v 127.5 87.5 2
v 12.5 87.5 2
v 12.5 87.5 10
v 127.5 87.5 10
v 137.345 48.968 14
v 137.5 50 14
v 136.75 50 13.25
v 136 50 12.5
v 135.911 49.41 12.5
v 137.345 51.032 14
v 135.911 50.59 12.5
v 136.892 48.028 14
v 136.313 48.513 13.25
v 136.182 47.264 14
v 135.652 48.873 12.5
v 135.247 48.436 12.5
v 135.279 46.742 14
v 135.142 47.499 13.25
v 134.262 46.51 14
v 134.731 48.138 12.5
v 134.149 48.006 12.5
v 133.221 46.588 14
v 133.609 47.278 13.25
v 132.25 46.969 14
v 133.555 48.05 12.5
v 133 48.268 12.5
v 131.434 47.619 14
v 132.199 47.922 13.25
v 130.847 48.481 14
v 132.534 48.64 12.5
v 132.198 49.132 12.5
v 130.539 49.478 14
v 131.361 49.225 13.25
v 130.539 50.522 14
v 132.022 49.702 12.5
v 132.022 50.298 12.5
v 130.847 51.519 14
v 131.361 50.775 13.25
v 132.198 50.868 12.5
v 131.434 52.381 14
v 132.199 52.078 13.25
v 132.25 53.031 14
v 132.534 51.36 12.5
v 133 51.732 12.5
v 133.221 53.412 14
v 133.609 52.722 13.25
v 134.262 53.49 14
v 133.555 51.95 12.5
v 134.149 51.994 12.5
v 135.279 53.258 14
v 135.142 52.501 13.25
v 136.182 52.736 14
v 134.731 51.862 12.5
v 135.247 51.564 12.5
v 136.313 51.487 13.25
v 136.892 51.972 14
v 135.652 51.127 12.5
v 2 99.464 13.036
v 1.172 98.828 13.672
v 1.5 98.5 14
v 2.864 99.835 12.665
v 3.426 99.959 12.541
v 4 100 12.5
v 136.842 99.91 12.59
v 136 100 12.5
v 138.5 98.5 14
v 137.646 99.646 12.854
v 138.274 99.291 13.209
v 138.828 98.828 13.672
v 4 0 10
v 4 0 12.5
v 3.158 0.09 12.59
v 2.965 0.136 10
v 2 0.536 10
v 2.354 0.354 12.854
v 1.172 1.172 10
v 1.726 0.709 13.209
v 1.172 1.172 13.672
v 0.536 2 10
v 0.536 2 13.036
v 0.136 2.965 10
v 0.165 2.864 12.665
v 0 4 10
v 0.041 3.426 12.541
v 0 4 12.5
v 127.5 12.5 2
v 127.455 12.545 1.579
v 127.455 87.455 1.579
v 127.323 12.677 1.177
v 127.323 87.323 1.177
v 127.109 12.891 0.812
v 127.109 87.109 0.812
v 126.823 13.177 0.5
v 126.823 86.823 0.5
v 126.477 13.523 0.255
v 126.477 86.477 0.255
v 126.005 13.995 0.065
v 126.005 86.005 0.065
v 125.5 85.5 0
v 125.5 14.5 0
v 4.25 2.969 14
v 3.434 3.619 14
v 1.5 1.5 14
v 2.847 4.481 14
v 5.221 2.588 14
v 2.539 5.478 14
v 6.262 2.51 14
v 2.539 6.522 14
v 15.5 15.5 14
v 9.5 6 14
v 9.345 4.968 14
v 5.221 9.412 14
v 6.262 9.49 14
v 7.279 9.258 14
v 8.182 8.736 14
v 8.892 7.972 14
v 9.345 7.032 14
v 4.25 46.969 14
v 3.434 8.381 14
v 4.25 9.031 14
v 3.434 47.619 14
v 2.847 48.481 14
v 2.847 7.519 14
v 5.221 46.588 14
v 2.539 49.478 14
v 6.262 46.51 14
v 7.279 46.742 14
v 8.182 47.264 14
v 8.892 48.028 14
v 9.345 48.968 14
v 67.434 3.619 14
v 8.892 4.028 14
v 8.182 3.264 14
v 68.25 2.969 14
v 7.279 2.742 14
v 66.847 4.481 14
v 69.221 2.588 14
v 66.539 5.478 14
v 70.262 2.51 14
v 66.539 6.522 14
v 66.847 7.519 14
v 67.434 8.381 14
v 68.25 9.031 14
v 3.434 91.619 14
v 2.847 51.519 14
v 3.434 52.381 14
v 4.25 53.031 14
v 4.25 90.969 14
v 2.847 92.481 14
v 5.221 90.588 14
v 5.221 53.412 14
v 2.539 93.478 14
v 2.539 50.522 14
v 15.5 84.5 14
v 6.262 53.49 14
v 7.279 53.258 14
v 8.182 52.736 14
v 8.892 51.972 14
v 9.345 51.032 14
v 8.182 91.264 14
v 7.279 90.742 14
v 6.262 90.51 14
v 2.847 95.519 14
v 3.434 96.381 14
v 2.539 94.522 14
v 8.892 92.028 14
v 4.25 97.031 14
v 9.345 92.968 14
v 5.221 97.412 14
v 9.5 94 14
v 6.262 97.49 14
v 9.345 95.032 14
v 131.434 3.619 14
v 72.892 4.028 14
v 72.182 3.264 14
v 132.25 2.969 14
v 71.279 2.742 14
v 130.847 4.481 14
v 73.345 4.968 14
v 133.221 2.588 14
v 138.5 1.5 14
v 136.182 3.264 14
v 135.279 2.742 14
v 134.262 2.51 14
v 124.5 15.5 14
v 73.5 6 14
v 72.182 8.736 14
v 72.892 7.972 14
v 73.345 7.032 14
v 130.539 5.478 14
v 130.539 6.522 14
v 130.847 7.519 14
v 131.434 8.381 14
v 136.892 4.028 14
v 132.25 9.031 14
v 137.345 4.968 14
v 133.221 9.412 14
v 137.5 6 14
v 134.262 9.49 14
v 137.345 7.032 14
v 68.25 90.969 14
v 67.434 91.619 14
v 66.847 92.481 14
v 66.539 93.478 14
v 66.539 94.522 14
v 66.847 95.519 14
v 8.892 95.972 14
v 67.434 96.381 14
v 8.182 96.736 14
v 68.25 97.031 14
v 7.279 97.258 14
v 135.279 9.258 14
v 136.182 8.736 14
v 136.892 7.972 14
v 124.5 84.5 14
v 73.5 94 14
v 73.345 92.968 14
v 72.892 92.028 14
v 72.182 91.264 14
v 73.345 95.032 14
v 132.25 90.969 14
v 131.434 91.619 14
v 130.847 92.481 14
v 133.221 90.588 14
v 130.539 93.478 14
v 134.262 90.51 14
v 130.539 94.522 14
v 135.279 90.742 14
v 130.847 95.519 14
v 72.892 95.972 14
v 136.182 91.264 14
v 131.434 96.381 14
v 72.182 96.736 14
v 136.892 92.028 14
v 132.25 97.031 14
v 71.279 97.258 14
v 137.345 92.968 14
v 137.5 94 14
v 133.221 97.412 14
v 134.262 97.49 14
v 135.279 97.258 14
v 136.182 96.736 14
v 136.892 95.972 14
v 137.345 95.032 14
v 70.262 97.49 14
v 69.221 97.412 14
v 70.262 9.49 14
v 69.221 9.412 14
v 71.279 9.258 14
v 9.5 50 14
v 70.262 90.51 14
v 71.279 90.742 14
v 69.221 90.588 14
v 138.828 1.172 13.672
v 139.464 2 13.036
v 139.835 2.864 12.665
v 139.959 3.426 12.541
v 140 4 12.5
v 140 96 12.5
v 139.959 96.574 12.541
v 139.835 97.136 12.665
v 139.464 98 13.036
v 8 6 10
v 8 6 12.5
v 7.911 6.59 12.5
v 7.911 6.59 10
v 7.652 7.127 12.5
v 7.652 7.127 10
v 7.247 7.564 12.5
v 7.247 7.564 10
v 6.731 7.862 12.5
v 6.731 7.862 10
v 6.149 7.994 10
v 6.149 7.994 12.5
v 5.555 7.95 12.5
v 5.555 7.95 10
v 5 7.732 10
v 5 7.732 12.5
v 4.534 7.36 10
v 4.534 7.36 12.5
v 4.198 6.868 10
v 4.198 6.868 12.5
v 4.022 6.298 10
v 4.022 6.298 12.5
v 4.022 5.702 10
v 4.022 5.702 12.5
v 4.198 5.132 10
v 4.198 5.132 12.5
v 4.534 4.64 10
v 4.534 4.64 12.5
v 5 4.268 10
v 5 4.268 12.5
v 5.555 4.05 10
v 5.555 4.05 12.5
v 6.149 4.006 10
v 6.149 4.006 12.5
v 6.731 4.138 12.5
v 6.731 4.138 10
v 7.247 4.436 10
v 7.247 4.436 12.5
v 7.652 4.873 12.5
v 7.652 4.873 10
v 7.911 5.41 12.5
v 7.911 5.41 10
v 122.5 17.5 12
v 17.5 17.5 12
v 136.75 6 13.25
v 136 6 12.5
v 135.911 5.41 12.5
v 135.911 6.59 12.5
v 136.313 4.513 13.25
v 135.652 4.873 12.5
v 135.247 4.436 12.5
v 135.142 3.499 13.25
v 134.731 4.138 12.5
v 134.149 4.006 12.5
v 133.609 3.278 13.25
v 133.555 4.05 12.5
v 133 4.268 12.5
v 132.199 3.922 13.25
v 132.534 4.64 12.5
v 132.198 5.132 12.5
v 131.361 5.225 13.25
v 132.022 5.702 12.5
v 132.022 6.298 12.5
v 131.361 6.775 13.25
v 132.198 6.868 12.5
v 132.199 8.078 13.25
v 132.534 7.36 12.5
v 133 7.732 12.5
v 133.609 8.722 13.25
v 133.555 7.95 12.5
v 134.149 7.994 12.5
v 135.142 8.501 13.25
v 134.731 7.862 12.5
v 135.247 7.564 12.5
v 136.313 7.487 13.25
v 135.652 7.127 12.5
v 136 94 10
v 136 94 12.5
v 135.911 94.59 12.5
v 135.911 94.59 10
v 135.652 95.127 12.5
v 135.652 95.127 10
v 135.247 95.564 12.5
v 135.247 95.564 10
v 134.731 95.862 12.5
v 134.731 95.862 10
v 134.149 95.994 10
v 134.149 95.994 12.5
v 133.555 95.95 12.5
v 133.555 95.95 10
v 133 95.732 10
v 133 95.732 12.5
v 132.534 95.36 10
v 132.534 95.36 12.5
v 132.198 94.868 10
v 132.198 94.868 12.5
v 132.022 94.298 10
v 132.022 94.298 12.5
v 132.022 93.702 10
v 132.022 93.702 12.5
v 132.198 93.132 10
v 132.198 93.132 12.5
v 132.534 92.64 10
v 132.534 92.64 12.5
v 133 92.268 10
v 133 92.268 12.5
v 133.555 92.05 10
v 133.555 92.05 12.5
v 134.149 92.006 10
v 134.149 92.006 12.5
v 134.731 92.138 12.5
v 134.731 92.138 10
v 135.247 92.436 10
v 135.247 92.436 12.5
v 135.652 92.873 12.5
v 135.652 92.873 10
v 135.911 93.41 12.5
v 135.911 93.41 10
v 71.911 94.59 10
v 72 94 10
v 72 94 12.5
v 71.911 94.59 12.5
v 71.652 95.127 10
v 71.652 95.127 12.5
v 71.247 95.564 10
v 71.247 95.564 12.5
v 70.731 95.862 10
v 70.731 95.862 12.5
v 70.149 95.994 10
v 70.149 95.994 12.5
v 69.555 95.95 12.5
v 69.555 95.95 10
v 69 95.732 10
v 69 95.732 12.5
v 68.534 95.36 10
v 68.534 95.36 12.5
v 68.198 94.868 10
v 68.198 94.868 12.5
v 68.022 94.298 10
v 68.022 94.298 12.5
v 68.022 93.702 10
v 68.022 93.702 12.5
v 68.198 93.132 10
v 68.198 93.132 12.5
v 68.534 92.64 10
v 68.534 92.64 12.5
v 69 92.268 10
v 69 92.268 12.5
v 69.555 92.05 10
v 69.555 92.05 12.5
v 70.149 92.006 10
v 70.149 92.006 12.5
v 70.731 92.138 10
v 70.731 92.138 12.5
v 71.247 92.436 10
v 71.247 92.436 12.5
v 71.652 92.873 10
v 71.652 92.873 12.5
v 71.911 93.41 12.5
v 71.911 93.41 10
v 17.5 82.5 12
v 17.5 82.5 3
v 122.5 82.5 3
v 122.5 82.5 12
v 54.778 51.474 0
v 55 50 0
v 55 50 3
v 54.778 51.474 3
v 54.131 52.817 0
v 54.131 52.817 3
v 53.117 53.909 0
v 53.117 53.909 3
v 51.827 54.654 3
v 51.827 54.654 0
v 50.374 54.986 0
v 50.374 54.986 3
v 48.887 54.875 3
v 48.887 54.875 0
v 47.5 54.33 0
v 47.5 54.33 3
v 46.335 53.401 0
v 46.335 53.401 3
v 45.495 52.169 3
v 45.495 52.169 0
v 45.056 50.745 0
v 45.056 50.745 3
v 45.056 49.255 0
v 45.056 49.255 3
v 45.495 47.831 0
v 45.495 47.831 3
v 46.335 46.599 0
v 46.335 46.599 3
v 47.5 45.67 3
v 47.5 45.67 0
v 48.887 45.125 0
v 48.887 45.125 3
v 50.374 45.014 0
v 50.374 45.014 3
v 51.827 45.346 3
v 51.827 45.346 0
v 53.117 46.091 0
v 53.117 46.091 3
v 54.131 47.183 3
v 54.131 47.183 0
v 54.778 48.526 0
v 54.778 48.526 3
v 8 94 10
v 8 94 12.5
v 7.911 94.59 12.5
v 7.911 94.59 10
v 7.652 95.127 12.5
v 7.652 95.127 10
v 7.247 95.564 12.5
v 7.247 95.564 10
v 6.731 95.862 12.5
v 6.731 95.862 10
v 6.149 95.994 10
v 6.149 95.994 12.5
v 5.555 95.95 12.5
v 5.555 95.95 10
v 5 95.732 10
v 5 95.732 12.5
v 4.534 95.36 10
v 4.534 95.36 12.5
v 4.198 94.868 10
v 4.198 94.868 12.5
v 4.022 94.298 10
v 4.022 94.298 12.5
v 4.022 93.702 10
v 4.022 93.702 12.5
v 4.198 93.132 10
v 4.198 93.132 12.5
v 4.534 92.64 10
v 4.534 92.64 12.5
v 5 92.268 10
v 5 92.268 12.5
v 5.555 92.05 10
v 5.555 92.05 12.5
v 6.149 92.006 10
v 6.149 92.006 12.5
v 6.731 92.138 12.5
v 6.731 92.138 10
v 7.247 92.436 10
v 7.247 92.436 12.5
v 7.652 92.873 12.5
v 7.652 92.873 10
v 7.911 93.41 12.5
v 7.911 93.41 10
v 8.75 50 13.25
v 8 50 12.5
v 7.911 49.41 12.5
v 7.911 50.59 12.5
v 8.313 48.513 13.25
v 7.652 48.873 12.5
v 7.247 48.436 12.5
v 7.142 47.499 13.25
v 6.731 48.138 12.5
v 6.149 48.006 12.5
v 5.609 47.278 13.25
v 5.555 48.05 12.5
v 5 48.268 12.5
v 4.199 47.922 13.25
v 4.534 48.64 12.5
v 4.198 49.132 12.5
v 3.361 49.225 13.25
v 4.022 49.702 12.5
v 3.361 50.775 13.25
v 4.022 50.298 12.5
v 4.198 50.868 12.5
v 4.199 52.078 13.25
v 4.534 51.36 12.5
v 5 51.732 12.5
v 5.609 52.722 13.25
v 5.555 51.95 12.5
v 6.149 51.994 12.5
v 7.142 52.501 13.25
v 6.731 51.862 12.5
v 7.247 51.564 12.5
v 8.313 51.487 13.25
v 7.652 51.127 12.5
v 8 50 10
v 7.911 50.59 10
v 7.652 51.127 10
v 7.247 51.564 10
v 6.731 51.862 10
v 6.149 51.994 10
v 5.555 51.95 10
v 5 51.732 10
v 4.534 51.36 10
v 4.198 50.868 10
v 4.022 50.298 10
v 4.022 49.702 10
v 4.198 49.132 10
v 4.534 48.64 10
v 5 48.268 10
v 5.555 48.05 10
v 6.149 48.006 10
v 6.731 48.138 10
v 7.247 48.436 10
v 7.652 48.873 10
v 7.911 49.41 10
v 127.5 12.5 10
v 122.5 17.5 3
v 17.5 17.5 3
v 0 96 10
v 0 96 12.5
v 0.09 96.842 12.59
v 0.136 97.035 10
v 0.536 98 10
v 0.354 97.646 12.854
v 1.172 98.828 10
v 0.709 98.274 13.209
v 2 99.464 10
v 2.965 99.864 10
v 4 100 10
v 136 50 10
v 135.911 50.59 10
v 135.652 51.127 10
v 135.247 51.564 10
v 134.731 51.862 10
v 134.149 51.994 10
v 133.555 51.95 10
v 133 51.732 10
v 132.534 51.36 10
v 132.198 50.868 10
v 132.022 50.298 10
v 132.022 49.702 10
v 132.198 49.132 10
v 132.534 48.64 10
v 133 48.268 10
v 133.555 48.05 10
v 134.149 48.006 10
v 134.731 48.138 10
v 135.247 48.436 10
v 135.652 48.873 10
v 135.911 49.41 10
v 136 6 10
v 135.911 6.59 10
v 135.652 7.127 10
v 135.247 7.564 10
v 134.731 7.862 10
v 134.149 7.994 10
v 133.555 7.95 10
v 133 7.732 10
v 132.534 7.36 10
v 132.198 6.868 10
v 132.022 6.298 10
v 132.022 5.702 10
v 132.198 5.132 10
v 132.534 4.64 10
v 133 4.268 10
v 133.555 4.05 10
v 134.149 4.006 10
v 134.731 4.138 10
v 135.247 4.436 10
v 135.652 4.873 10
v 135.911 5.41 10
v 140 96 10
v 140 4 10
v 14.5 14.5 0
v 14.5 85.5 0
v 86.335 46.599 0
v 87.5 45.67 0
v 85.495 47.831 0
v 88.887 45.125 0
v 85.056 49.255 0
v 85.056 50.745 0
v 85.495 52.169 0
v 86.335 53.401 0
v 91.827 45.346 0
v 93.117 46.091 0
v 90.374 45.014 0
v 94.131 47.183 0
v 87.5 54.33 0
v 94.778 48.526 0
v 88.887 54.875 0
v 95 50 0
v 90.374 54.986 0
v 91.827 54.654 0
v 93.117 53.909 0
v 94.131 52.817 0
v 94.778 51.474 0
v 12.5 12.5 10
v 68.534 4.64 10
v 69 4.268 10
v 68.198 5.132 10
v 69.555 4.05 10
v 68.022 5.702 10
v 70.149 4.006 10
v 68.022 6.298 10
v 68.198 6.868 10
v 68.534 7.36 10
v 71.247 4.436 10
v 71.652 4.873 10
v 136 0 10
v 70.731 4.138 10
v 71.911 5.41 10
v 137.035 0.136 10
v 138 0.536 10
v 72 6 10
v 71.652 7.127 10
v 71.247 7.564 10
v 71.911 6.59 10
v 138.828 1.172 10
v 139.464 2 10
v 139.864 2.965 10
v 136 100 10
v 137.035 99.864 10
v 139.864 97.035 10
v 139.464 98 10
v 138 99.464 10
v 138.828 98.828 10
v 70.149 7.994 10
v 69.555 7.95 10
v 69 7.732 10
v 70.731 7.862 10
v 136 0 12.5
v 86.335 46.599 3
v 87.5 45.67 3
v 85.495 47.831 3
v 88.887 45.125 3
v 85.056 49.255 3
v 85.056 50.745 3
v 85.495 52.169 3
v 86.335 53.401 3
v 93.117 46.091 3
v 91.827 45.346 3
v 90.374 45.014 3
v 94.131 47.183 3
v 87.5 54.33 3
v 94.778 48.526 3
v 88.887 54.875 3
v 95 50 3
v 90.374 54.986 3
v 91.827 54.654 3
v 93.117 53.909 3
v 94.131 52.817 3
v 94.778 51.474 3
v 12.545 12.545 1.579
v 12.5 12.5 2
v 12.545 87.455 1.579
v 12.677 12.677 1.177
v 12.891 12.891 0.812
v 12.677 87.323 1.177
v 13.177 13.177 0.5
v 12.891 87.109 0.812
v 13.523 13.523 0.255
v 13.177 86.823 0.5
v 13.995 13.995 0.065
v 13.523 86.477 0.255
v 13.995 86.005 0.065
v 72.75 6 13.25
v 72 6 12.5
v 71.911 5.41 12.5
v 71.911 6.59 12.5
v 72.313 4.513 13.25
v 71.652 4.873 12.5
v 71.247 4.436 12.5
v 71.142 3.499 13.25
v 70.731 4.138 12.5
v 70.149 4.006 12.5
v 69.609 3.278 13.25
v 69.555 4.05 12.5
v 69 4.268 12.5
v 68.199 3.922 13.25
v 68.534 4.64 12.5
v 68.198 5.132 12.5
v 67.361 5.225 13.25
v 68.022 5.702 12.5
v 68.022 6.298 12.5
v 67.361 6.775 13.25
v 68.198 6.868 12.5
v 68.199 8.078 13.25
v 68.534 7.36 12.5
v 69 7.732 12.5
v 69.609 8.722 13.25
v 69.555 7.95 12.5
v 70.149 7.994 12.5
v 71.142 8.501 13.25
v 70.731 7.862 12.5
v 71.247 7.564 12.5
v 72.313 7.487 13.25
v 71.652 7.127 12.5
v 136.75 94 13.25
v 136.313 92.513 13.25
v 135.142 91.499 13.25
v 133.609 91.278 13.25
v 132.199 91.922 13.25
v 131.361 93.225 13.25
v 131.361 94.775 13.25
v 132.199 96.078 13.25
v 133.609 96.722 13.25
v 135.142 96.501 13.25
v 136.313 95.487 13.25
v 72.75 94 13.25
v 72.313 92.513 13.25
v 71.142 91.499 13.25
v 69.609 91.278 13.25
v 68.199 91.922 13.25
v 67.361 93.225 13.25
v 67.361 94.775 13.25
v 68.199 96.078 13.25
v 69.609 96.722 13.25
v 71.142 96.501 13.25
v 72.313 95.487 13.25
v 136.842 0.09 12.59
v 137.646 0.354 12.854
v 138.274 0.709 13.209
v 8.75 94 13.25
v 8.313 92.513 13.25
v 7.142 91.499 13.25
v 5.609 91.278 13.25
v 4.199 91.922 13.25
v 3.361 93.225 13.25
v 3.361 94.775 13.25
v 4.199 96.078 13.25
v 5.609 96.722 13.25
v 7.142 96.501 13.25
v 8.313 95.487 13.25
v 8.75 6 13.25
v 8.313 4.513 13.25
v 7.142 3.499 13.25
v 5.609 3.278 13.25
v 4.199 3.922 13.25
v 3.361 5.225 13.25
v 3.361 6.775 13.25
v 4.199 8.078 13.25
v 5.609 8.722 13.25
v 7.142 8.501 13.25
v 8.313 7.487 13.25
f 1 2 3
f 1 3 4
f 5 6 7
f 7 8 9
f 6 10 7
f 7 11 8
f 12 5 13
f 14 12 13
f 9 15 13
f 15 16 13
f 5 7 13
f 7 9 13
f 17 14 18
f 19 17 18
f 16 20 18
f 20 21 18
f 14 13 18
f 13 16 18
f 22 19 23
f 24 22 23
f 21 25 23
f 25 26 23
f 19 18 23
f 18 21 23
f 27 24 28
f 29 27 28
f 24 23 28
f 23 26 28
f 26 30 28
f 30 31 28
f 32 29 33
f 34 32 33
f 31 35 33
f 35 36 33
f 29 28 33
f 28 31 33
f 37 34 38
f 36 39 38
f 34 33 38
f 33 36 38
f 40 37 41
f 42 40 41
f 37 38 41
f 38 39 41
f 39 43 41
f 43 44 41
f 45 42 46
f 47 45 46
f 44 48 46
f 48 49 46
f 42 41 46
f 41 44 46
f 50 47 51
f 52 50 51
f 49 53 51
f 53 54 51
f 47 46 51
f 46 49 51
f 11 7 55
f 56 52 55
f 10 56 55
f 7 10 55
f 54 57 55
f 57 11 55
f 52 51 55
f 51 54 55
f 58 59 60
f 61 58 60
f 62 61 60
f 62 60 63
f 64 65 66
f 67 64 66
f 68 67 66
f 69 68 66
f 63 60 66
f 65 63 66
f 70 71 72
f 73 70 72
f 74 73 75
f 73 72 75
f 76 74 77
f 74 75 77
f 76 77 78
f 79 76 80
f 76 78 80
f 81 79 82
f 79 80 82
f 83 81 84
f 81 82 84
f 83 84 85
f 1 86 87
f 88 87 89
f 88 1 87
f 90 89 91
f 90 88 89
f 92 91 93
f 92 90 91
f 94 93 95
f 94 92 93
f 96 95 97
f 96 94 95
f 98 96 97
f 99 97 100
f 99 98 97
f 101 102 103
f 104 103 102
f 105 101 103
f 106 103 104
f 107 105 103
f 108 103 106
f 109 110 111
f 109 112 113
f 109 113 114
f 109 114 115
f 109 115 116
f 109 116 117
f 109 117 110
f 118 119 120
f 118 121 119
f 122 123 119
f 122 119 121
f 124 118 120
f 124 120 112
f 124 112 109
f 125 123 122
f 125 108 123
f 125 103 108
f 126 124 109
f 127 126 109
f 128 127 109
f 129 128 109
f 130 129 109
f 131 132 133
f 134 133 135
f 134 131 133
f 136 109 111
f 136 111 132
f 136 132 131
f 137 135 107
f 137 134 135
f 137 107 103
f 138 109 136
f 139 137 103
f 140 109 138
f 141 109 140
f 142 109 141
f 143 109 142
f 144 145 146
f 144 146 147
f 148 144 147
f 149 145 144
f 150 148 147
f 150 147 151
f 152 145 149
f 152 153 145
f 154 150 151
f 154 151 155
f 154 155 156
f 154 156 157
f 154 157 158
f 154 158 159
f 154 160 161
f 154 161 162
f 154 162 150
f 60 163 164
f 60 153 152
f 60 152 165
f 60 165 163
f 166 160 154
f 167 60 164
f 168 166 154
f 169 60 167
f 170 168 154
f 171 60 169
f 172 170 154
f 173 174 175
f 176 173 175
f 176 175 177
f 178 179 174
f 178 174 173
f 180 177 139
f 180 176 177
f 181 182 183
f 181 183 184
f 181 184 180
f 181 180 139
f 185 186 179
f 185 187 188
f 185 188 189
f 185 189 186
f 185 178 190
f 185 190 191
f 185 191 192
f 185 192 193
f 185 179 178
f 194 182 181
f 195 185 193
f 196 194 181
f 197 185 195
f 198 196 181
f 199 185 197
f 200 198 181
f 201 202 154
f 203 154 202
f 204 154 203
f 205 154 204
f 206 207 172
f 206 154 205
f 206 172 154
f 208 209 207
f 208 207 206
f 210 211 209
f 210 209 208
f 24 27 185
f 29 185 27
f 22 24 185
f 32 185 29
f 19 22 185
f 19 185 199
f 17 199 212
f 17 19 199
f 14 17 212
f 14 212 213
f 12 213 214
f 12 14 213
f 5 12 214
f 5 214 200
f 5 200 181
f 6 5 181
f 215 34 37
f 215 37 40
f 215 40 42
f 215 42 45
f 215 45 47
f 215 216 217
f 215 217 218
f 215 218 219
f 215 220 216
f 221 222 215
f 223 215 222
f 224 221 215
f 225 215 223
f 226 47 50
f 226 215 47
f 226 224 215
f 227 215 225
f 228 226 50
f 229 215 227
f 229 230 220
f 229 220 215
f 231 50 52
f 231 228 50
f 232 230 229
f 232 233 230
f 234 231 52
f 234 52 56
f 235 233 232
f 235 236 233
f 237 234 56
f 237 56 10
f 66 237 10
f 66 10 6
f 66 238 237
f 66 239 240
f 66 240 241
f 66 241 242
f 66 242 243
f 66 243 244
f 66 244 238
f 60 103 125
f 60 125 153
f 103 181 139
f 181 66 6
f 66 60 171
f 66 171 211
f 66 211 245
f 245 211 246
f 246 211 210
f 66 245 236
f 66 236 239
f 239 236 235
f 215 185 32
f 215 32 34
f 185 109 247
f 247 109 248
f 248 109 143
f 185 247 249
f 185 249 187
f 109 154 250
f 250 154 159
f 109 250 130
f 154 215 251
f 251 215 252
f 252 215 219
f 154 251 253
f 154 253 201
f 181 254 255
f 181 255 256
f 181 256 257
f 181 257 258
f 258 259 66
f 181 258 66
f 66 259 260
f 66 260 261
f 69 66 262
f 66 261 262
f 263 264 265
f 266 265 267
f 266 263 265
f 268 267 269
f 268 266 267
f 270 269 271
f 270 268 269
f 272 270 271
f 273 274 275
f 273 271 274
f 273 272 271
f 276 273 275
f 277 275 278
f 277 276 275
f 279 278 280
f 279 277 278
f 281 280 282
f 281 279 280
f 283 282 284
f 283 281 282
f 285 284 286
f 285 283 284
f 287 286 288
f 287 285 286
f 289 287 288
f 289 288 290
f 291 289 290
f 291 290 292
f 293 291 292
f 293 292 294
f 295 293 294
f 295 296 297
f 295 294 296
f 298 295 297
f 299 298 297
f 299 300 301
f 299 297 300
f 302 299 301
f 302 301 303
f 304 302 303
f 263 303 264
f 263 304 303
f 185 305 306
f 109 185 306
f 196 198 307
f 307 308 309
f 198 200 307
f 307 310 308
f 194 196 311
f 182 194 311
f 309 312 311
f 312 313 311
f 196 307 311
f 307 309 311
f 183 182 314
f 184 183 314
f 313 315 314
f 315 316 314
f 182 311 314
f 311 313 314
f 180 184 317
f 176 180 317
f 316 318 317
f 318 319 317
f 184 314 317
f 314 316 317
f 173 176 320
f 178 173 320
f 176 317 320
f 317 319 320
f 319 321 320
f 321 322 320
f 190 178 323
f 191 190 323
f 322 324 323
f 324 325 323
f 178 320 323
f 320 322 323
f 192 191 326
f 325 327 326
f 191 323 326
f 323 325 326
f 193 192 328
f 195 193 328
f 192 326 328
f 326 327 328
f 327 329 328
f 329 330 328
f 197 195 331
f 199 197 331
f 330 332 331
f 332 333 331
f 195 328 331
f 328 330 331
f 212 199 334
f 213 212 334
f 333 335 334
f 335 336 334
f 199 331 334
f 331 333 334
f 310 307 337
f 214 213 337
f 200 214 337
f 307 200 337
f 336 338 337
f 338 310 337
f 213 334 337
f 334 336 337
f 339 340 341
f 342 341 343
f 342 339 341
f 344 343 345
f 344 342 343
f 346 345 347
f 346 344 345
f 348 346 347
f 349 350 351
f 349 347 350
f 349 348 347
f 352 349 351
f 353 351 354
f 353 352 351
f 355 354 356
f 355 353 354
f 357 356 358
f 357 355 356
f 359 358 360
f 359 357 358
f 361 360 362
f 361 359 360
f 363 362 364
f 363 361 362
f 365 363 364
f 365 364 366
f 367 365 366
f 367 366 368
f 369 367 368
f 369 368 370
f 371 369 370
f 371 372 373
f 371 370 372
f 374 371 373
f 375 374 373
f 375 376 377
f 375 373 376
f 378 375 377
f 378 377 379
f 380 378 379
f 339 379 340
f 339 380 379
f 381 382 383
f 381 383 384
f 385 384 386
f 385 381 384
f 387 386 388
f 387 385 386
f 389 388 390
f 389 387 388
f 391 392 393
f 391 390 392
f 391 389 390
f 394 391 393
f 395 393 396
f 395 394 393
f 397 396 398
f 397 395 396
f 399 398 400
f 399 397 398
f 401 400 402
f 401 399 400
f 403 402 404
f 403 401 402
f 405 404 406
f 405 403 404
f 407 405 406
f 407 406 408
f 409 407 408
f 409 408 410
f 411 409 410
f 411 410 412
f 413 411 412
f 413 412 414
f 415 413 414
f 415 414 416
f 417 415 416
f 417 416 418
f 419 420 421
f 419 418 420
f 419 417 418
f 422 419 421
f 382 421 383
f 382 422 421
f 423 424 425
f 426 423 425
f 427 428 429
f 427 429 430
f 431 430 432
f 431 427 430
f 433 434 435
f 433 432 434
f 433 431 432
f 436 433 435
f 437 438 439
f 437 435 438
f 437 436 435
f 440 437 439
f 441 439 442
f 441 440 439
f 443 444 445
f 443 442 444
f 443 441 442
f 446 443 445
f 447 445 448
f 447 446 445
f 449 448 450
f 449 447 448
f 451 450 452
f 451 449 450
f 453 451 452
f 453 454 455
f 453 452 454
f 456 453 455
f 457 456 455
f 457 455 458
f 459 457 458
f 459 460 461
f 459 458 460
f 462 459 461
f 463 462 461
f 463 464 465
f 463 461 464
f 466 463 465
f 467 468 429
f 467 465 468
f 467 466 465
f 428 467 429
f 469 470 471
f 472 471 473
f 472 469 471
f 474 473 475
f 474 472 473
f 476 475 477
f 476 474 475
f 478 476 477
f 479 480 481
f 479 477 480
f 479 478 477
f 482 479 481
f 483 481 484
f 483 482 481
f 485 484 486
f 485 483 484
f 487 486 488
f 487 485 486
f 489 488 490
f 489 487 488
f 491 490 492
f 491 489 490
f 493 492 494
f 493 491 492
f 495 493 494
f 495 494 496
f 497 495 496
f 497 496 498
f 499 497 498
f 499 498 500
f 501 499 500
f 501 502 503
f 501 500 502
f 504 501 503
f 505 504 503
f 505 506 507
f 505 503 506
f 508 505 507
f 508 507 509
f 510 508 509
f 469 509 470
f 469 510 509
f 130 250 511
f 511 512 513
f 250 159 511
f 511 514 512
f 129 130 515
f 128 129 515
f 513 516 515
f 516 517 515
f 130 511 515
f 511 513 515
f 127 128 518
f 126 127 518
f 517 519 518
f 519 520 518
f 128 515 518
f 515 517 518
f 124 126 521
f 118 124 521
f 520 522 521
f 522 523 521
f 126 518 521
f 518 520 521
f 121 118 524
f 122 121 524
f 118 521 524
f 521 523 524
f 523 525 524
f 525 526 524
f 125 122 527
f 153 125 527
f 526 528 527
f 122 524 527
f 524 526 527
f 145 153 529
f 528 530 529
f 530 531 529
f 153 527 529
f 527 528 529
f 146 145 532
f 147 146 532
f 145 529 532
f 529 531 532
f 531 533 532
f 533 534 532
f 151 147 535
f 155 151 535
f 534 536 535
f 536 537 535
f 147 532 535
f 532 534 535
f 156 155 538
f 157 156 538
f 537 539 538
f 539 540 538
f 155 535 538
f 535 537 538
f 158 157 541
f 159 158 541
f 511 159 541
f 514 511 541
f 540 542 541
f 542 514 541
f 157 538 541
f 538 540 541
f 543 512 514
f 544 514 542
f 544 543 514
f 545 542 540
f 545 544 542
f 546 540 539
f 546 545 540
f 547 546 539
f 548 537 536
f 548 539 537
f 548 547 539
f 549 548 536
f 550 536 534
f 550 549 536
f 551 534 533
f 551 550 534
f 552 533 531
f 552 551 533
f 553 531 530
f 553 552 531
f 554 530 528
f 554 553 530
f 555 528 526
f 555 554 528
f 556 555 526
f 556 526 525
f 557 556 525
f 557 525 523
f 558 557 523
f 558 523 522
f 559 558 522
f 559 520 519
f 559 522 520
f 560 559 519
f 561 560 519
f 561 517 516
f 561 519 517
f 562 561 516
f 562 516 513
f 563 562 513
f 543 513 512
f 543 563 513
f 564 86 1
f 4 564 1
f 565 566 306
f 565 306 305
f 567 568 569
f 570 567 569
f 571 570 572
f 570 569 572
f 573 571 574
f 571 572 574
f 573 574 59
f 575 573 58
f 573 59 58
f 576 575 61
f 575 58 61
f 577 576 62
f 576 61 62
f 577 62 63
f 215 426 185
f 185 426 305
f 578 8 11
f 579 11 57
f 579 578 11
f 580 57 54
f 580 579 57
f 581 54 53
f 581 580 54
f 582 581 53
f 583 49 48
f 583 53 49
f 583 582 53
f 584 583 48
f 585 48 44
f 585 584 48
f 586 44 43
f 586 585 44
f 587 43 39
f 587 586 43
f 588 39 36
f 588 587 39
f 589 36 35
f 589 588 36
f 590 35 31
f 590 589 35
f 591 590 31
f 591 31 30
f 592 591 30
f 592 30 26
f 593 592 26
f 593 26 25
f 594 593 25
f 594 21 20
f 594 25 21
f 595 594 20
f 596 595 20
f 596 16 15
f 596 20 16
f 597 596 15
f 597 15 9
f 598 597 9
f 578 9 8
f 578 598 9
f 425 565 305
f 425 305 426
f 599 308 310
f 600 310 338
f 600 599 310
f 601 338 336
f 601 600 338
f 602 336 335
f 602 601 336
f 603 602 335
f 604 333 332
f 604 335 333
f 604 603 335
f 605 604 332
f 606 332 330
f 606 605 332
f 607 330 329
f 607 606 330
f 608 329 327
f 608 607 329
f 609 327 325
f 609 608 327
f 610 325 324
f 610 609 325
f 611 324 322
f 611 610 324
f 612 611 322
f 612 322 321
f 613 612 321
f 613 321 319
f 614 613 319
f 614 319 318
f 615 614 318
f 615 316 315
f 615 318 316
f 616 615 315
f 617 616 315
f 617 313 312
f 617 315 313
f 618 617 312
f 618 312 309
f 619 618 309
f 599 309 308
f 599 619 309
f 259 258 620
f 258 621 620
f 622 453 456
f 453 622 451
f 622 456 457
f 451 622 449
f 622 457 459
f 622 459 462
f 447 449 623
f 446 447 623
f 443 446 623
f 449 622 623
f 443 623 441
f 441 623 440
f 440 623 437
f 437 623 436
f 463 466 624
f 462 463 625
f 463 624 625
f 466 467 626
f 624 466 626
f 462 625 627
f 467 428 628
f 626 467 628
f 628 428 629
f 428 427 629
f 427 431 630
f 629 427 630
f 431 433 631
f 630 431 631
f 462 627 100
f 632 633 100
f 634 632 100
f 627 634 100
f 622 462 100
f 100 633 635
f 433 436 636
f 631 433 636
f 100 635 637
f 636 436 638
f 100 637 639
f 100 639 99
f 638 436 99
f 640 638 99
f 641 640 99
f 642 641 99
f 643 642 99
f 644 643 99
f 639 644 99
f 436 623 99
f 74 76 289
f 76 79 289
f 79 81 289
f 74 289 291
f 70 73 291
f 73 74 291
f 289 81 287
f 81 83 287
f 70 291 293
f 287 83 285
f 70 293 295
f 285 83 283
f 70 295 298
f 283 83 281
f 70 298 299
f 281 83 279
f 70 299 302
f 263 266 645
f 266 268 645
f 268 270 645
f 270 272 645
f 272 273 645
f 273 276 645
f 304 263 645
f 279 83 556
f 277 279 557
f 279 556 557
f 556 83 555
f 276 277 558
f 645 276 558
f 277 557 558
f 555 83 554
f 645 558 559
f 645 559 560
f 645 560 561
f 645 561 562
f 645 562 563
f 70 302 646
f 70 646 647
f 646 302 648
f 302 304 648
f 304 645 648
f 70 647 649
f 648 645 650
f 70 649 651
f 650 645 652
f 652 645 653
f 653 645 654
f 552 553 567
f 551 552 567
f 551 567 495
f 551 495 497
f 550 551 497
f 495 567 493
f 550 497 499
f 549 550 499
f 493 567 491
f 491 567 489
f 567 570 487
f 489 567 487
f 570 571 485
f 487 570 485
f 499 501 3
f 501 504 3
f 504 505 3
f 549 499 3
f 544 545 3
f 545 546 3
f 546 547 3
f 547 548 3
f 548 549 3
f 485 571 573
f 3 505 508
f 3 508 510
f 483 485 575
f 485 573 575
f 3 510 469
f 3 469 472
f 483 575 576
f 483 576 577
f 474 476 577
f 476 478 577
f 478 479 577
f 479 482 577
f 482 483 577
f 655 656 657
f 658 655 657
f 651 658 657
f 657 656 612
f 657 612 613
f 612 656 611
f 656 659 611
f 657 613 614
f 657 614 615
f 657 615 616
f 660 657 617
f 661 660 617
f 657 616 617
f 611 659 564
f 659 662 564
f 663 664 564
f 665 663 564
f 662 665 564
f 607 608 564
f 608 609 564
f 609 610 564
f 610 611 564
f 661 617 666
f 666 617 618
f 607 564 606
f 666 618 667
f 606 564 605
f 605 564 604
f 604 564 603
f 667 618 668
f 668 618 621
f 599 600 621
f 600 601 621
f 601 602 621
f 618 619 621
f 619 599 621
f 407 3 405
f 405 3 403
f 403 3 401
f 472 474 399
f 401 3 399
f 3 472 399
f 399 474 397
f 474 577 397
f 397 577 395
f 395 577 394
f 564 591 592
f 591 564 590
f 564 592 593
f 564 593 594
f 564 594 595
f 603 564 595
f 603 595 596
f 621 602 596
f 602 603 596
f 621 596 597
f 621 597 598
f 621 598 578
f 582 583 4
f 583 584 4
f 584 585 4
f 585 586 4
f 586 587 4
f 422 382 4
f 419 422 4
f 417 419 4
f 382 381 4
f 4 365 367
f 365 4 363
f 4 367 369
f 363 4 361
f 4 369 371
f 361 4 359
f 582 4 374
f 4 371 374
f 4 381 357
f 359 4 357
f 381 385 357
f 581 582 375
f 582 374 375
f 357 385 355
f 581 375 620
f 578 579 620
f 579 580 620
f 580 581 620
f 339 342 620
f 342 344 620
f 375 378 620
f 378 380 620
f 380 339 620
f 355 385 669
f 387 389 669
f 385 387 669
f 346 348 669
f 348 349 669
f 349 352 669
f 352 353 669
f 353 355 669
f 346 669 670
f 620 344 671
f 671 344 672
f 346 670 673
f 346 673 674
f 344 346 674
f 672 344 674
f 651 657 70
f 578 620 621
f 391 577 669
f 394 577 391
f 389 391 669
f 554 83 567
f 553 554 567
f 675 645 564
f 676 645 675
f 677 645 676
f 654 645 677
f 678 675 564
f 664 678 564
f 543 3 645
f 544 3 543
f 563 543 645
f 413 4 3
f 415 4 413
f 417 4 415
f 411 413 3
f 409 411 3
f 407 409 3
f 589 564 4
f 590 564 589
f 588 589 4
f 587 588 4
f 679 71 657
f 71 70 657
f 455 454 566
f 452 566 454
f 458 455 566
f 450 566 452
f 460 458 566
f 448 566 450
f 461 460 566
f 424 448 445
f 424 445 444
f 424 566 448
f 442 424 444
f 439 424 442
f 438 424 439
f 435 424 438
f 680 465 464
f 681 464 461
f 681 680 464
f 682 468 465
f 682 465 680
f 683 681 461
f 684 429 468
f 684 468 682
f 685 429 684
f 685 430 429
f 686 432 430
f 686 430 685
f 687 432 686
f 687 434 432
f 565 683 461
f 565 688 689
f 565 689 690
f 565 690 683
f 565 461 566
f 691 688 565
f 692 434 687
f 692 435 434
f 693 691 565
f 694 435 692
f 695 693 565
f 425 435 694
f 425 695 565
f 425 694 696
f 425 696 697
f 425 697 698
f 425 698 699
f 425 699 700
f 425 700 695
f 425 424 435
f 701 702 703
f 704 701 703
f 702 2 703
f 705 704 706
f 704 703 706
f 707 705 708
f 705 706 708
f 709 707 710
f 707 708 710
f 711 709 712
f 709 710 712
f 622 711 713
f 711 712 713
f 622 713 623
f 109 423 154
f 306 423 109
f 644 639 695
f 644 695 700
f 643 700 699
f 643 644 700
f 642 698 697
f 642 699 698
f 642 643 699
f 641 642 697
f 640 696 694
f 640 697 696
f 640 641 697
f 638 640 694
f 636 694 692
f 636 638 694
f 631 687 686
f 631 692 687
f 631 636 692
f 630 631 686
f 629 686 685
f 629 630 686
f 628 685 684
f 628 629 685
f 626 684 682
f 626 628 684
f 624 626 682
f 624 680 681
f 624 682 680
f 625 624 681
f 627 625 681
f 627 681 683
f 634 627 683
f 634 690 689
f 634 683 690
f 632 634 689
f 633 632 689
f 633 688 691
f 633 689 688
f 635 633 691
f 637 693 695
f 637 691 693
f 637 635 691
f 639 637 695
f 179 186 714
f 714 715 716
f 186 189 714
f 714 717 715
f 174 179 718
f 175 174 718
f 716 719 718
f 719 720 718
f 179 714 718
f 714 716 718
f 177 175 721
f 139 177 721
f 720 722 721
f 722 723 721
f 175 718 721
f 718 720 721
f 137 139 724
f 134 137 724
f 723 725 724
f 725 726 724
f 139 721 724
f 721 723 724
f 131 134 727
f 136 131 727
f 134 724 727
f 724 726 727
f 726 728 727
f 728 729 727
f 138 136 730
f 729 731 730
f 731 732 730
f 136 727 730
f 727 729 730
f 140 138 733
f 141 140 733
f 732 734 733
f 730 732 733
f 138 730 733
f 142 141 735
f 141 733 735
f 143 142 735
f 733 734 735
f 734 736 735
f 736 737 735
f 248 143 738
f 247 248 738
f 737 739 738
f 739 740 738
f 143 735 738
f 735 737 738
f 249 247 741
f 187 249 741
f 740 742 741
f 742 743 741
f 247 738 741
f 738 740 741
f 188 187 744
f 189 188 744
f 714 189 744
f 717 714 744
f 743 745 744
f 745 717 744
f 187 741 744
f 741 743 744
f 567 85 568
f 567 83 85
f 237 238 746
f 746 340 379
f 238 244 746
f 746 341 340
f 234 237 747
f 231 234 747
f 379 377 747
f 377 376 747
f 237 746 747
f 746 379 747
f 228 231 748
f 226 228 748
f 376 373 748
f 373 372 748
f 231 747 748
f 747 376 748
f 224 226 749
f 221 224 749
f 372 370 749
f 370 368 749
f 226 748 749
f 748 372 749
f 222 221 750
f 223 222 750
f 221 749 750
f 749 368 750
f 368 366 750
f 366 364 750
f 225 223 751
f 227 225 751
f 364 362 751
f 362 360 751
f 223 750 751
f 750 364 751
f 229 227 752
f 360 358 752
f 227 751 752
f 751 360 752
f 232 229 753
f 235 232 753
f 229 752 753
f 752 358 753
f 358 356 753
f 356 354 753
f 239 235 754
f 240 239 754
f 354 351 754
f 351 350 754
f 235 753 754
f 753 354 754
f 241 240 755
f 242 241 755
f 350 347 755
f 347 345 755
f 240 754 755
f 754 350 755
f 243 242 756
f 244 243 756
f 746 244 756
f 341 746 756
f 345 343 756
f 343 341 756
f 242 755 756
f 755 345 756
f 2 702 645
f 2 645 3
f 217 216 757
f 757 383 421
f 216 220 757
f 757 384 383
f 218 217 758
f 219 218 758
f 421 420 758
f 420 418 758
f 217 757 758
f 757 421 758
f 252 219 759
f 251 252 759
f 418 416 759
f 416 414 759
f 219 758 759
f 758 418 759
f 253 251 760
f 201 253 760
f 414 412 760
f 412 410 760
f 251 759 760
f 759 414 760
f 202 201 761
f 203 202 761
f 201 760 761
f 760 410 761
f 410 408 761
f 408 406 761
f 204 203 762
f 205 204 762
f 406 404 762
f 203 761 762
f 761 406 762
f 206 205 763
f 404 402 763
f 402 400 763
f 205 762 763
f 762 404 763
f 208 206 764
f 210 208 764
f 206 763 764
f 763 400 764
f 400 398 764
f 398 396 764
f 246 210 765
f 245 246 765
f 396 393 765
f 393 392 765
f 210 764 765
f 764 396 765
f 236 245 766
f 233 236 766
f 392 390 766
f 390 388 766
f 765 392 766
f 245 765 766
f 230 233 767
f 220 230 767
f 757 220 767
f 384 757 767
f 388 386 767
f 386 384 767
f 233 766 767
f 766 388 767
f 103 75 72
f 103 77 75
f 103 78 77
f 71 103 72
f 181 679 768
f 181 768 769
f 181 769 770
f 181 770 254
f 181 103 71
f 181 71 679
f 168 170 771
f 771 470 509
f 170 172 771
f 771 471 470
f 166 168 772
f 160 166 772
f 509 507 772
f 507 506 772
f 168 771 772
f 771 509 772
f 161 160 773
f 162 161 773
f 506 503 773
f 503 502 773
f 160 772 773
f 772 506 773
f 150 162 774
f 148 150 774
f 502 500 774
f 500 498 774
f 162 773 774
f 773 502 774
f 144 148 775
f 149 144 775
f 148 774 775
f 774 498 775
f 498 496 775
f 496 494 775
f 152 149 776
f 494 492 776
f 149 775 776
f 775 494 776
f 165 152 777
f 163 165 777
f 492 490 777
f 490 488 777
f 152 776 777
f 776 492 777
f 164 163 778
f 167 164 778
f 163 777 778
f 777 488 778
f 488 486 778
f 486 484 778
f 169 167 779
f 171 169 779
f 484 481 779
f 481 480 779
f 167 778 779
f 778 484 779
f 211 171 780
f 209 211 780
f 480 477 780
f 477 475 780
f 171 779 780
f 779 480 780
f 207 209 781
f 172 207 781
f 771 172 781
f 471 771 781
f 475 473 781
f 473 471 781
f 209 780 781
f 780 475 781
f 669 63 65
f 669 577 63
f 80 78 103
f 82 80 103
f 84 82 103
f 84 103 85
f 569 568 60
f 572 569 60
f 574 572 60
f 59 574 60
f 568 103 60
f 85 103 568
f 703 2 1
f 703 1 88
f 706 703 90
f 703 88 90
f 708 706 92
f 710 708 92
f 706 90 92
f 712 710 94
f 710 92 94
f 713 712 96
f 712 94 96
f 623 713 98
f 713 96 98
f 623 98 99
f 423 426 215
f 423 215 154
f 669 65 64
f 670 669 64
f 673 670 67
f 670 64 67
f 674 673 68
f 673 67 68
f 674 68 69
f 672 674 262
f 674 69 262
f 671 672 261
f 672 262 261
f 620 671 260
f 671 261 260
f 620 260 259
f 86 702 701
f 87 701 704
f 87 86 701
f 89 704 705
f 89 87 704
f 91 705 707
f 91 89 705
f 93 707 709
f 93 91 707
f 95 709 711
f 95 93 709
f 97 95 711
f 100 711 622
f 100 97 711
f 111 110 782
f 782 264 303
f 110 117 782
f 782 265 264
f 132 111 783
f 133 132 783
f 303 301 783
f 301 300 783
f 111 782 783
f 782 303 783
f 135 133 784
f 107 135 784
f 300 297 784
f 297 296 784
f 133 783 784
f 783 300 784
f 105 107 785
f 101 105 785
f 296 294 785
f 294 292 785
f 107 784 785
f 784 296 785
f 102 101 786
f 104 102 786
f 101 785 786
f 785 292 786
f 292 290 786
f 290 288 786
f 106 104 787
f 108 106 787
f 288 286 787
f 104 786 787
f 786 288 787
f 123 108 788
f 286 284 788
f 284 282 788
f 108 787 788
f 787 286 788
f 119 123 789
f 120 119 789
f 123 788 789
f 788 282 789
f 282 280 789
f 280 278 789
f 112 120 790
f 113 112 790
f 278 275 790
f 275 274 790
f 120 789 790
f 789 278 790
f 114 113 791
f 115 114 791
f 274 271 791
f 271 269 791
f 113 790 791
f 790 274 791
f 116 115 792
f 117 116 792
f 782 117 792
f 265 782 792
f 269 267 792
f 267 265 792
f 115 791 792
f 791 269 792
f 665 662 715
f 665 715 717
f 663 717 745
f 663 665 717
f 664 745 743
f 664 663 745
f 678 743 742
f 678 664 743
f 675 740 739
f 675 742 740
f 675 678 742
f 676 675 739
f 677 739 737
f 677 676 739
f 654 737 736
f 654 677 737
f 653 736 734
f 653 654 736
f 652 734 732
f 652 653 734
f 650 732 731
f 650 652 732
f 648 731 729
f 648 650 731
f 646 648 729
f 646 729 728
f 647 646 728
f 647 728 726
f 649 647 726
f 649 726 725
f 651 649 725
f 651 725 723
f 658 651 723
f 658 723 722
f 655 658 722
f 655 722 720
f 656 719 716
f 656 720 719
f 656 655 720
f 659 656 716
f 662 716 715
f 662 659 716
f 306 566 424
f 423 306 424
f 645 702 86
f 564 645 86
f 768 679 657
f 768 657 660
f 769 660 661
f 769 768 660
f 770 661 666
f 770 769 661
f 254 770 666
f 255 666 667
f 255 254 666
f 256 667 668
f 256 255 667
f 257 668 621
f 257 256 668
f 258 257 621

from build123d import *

# Parameters (mm, degrees)
CYLINDER009_R     = 5
CYLINDER009_DEPTH = 20
CYLINDER008_R     = 2
CYLINDER008_DEPTH = 20
CYLINDER007_R     = 2
CYLINDER007_DEPTH = 20
CYLINDER006_R     = 5
CYLINDER006_DEPTH = 20
BOX002_W          = 105
BOX002_H          = 65
BOX002_DEPTH      = 20
BOX001_W          = 115
BOX001_H          = 75
BOX001_DEPTH      = 10
FILLET_R          = 2
CYLINDER003_R     = 2
CYLINDER003_DEPTH = 10
CYLINDER002_R     = 2
CYLINDER002_DEPTH = 10
CYLINDER004_R     = 2
CYLINDER004_DEPTH = 10
CYLINDER005_R     = 2
CYLINDER005_DEPTH = 10
CYLINDER001_R     = 2
CYLINDER001_DEPTH = 10
CYLINDER_R        = 2
CYLINDER_DEPTH    = 10
BOX_W             = 140
BOX_H             = 100
BOX_DEPTH         = 4
CHAMFER_SIZE      = 1.5
CHAMFER001_SIZE   = 2
FILLET001_R       = 4
FILLET002_R       = 4
CHAMFER002_SIZE   = 1.5


with BuildPart() as cylinder009:
    # Cylinder009 → Cylinder009 (new body)
    with BuildSketch(Plane(origin=(90, 50, -5), x_dir=(1, 0, 0), z_dir=(0, 0, 1))):
        Circle(CYLINDER009_R)
    extrude(amount=CYLINDER009_DEPTH)


with BuildPart() as cylinder008:
    # Cylinder008 → Cylinder008 (new body)
    with BuildSketch(Plane(origin=(70, 6, 0), x_dir=(1, 0, 0), z_dir=(0, 0, 1))):
        Circle(CYLINDER008_R)
    extrude(amount=CYLINDER008_DEPTH)


with BuildPart() as cylinder007:
    # Cylinder007 → Cylinder007 (new body)
    with BuildSketch(Plane(origin=(70, 94, 0), x_dir=(1, 0, 0), z_dir=(0, 0, 1))):
        Circle(CYLINDER007_R)
    extrude(amount=CYLINDER007_DEPTH)


with BuildPart() as cylinder006:
    # Cylinder006 → Cylinder006 (new body)
    with BuildSketch(Plane(origin=(50, 50, -5), x_dir=(1, 0, 0), z_dir=(0, 0, 1))):
        Circle(CYLINDER006_R)
    extrude(amount=CYLINDER006_DEPTH)


with BuildPart() as cube002:
    # Box002 → Box002 (new body)
    with BuildSketch(Plane(origin=(17.5, 17.5, 3), x_dir=(1, 0, 0), z_dir=(0, 0, 1))):
        with Locations((52.5, 32.5)):
            Rectangle(BOX002_W, BOX002_H)
    extrude(amount=BOX002_DEPTH)


with BuildPart() as fillet_body:
    # Box001 → Box001 (new body)
    with BuildSketch(Plane(origin=(12.5, 12.5, 0), x_dir=(1, 0, 0), z_dir=(0, 0, 1))):
        with Locations((57.5, 37.5)):
            Rectangle(BOX001_W, BOX001_H)
    extrude(amount=BOX001_DEPTH)

    # Fillet
    fillet_edges = [fillet_body.edges().sort_by_distance(p)[0] for p in [
        (12.5, 50, 0),
        (127.5, 50, 0),
        (70, 12.5, 0),
        (70, 87.5, 0),
    ]]
    fillet(fillet_edges, radius=FILLET_R)


with BuildPart() as cylinder003:
    # Cylinder003 → Cylinder003 (new body)
    with BuildSketch(Plane(origin=(6, 94, 0), x_dir=(1, 0, 0), z_dir=(0, 0, 1))):
        Circle(CYLINDER003_R)
    extrude(amount=CYLINDER003_DEPTH)


with BuildPart() as cylinder002:
    # Cylinder002 → Cylinder002 (new body)
    with BuildSketch(Plane(origin=(6, 50, 0), x_dir=(1, 0, 0), z_dir=(0, 0, 1))):
        Circle(CYLINDER002_R)
    extrude(amount=CYLINDER002_DEPTH)


with BuildPart() as cylinder004:
    # Cylinder004 → Cylinder004 (new body)
    with BuildSketch(Plane(origin=(6, 6, 0), x_dir=(1, 0, 0), z_dir=(0, 0, 1))):
        Circle(CYLINDER004_R)
    extrude(amount=CYLINDER004_DEPTH)


with BuildPart() as cylinder005:
    # Cylinder005 → Cylinder005 (new body)
    with BuildSketch(Plane(origin=(134, 94, 0), x_dir=(1, 0, 0), z_dir=(0, 0, 1))):
        Circle(CYLINDER005_R)
    extrude(amount=CYLINDER005_DEPTH)


with BuildPart() as cylinder001:
    # Cylinder001 → Cylinder001 (new body)
    with BuildSketch(Plane(origin=(134, 50, 0), x_dir=(1, 0, 0), z_dir=(0, 0, 1))):
        Circle(CYLINDER001_R)
    extrude(amount=CYLINDER001_DEPTH)


with BuildPart() as cylinder:
    # Cylinder → Cylinder (new body)
    with BuildSketch(Plane(origin=(134, 6, 0), x_dir=(1, 0, 0), z_dir=(0, 0, 1))):
        Circle(CYLINDER_R)
    extrude(amount=CYLINDER_DEPTH)


with BuildPart() as cut010:
    # Box → Box (new body)
    with BuildSketch(Plane.XY):
        with Locations((70, 50)):
            Rectangle(BOX_W, BOX_H)
    extrude(amount=BOX_DEPTH)

    # Cut: cut Cylinder
    add(cylinder.part, mode=Mode.SUBTRACT)

    # Cut001: cut Cylinder001
    add(cylinder001.part, mode=Mode.SUBTRACT)

    # Cut002: cut Cylinder005
    add(cylinder005.part, mode=Mode.SUBTRACT)

    # Cut003: cut Cylinder004
    add(cylinder004.part, mode=Mode.SUBTRACT)

    # Cut004: cut Cylinder002
    add(cylinder002.part, mode=Mode.SUBTRACT)

    # Cut005: cut Cylinder003
    add(cylinder003.part, mode=Mode.SUBTRACT)


with BuildPart() as cut010_1:
    # Cut005 placement: moved
    add(cut010.part.moved(Location((0, 0, 10))))

    # Chamfer
    chamfer_edges = [cut010_1.edges().sort_by_distance(p)[0] for p in [
        (4, 50, 14),
        (4, 6, 14),
        (0, 50, 14),
        (70, 100, 14),
        (70, 0, 14),
        (140, 50, 14),
        (4, 94, 14),
        (132, 94, 14),
        (132, 50, 14),
        (132, 6, 14),
    ]]
    chamfer(chamfer_edges, length=CHAMFER_SIZE)

    # Fusion: union Fillet body
    add(fillet_body.part)

    # Cut006: cut Cube002
    add(cube002.part, mode=Mode.SUBTRACT)

    # Cut007: cut Cylinder006
    add(cylinder006.part, mode=Mode.SUBTRACT)

    # Chamfer001
    chamfer001_edges = [cut010_1.edges().sort_by_distance(p)[0] for p in [
        (122.5, 50, 14),
        (70, 17.5, 14),
        (17.5, 50, 14),
        (70, 82.5, 14),
    ]]
    chamfer(chamfer001_edges, length=CHAMFER001_SIZE)

    # Fillet001
    fillet001_edges = [cut010_1.edges().sort_by_distance(p)[0] for p in [
        (140, 0, 11.25),
        (140, 100, 11.25),
    ]]
    fillet(fillet001_edges, radius=FILLET001_R)

    # Fillet002
    fillet002_edges = [cut010_1.edges().sort_by_distance(p)[0] for p in [
        (0, 0, 11.25),
        (0, 100, 11.25),
    ]]
    fillet(fillet002_edges, radius=FILLET002_R)

    # Cut008: cut Cylinder007
    add(cylinder007.part, mode=Mode.SUBTRACT)

    # Cut009: cut Cylinder008
    add(cylinder008.part, mode=Mode.SUBTRACT)

    # Chamfer002
    chamfer002_edges = [cut010_1.edges().sort_by_distance(p)[0] for p in [
        (68, 6, 14),
        (68, 94, 14),
    ]]
    chamfer(chamfer002_edges, length=CHAMFER002_SIZE)

    # Cut010: cut Cylinder009
    add(cylinder009.part, mode=Mode.SUBTRACT)


solid = cut010_1.part
